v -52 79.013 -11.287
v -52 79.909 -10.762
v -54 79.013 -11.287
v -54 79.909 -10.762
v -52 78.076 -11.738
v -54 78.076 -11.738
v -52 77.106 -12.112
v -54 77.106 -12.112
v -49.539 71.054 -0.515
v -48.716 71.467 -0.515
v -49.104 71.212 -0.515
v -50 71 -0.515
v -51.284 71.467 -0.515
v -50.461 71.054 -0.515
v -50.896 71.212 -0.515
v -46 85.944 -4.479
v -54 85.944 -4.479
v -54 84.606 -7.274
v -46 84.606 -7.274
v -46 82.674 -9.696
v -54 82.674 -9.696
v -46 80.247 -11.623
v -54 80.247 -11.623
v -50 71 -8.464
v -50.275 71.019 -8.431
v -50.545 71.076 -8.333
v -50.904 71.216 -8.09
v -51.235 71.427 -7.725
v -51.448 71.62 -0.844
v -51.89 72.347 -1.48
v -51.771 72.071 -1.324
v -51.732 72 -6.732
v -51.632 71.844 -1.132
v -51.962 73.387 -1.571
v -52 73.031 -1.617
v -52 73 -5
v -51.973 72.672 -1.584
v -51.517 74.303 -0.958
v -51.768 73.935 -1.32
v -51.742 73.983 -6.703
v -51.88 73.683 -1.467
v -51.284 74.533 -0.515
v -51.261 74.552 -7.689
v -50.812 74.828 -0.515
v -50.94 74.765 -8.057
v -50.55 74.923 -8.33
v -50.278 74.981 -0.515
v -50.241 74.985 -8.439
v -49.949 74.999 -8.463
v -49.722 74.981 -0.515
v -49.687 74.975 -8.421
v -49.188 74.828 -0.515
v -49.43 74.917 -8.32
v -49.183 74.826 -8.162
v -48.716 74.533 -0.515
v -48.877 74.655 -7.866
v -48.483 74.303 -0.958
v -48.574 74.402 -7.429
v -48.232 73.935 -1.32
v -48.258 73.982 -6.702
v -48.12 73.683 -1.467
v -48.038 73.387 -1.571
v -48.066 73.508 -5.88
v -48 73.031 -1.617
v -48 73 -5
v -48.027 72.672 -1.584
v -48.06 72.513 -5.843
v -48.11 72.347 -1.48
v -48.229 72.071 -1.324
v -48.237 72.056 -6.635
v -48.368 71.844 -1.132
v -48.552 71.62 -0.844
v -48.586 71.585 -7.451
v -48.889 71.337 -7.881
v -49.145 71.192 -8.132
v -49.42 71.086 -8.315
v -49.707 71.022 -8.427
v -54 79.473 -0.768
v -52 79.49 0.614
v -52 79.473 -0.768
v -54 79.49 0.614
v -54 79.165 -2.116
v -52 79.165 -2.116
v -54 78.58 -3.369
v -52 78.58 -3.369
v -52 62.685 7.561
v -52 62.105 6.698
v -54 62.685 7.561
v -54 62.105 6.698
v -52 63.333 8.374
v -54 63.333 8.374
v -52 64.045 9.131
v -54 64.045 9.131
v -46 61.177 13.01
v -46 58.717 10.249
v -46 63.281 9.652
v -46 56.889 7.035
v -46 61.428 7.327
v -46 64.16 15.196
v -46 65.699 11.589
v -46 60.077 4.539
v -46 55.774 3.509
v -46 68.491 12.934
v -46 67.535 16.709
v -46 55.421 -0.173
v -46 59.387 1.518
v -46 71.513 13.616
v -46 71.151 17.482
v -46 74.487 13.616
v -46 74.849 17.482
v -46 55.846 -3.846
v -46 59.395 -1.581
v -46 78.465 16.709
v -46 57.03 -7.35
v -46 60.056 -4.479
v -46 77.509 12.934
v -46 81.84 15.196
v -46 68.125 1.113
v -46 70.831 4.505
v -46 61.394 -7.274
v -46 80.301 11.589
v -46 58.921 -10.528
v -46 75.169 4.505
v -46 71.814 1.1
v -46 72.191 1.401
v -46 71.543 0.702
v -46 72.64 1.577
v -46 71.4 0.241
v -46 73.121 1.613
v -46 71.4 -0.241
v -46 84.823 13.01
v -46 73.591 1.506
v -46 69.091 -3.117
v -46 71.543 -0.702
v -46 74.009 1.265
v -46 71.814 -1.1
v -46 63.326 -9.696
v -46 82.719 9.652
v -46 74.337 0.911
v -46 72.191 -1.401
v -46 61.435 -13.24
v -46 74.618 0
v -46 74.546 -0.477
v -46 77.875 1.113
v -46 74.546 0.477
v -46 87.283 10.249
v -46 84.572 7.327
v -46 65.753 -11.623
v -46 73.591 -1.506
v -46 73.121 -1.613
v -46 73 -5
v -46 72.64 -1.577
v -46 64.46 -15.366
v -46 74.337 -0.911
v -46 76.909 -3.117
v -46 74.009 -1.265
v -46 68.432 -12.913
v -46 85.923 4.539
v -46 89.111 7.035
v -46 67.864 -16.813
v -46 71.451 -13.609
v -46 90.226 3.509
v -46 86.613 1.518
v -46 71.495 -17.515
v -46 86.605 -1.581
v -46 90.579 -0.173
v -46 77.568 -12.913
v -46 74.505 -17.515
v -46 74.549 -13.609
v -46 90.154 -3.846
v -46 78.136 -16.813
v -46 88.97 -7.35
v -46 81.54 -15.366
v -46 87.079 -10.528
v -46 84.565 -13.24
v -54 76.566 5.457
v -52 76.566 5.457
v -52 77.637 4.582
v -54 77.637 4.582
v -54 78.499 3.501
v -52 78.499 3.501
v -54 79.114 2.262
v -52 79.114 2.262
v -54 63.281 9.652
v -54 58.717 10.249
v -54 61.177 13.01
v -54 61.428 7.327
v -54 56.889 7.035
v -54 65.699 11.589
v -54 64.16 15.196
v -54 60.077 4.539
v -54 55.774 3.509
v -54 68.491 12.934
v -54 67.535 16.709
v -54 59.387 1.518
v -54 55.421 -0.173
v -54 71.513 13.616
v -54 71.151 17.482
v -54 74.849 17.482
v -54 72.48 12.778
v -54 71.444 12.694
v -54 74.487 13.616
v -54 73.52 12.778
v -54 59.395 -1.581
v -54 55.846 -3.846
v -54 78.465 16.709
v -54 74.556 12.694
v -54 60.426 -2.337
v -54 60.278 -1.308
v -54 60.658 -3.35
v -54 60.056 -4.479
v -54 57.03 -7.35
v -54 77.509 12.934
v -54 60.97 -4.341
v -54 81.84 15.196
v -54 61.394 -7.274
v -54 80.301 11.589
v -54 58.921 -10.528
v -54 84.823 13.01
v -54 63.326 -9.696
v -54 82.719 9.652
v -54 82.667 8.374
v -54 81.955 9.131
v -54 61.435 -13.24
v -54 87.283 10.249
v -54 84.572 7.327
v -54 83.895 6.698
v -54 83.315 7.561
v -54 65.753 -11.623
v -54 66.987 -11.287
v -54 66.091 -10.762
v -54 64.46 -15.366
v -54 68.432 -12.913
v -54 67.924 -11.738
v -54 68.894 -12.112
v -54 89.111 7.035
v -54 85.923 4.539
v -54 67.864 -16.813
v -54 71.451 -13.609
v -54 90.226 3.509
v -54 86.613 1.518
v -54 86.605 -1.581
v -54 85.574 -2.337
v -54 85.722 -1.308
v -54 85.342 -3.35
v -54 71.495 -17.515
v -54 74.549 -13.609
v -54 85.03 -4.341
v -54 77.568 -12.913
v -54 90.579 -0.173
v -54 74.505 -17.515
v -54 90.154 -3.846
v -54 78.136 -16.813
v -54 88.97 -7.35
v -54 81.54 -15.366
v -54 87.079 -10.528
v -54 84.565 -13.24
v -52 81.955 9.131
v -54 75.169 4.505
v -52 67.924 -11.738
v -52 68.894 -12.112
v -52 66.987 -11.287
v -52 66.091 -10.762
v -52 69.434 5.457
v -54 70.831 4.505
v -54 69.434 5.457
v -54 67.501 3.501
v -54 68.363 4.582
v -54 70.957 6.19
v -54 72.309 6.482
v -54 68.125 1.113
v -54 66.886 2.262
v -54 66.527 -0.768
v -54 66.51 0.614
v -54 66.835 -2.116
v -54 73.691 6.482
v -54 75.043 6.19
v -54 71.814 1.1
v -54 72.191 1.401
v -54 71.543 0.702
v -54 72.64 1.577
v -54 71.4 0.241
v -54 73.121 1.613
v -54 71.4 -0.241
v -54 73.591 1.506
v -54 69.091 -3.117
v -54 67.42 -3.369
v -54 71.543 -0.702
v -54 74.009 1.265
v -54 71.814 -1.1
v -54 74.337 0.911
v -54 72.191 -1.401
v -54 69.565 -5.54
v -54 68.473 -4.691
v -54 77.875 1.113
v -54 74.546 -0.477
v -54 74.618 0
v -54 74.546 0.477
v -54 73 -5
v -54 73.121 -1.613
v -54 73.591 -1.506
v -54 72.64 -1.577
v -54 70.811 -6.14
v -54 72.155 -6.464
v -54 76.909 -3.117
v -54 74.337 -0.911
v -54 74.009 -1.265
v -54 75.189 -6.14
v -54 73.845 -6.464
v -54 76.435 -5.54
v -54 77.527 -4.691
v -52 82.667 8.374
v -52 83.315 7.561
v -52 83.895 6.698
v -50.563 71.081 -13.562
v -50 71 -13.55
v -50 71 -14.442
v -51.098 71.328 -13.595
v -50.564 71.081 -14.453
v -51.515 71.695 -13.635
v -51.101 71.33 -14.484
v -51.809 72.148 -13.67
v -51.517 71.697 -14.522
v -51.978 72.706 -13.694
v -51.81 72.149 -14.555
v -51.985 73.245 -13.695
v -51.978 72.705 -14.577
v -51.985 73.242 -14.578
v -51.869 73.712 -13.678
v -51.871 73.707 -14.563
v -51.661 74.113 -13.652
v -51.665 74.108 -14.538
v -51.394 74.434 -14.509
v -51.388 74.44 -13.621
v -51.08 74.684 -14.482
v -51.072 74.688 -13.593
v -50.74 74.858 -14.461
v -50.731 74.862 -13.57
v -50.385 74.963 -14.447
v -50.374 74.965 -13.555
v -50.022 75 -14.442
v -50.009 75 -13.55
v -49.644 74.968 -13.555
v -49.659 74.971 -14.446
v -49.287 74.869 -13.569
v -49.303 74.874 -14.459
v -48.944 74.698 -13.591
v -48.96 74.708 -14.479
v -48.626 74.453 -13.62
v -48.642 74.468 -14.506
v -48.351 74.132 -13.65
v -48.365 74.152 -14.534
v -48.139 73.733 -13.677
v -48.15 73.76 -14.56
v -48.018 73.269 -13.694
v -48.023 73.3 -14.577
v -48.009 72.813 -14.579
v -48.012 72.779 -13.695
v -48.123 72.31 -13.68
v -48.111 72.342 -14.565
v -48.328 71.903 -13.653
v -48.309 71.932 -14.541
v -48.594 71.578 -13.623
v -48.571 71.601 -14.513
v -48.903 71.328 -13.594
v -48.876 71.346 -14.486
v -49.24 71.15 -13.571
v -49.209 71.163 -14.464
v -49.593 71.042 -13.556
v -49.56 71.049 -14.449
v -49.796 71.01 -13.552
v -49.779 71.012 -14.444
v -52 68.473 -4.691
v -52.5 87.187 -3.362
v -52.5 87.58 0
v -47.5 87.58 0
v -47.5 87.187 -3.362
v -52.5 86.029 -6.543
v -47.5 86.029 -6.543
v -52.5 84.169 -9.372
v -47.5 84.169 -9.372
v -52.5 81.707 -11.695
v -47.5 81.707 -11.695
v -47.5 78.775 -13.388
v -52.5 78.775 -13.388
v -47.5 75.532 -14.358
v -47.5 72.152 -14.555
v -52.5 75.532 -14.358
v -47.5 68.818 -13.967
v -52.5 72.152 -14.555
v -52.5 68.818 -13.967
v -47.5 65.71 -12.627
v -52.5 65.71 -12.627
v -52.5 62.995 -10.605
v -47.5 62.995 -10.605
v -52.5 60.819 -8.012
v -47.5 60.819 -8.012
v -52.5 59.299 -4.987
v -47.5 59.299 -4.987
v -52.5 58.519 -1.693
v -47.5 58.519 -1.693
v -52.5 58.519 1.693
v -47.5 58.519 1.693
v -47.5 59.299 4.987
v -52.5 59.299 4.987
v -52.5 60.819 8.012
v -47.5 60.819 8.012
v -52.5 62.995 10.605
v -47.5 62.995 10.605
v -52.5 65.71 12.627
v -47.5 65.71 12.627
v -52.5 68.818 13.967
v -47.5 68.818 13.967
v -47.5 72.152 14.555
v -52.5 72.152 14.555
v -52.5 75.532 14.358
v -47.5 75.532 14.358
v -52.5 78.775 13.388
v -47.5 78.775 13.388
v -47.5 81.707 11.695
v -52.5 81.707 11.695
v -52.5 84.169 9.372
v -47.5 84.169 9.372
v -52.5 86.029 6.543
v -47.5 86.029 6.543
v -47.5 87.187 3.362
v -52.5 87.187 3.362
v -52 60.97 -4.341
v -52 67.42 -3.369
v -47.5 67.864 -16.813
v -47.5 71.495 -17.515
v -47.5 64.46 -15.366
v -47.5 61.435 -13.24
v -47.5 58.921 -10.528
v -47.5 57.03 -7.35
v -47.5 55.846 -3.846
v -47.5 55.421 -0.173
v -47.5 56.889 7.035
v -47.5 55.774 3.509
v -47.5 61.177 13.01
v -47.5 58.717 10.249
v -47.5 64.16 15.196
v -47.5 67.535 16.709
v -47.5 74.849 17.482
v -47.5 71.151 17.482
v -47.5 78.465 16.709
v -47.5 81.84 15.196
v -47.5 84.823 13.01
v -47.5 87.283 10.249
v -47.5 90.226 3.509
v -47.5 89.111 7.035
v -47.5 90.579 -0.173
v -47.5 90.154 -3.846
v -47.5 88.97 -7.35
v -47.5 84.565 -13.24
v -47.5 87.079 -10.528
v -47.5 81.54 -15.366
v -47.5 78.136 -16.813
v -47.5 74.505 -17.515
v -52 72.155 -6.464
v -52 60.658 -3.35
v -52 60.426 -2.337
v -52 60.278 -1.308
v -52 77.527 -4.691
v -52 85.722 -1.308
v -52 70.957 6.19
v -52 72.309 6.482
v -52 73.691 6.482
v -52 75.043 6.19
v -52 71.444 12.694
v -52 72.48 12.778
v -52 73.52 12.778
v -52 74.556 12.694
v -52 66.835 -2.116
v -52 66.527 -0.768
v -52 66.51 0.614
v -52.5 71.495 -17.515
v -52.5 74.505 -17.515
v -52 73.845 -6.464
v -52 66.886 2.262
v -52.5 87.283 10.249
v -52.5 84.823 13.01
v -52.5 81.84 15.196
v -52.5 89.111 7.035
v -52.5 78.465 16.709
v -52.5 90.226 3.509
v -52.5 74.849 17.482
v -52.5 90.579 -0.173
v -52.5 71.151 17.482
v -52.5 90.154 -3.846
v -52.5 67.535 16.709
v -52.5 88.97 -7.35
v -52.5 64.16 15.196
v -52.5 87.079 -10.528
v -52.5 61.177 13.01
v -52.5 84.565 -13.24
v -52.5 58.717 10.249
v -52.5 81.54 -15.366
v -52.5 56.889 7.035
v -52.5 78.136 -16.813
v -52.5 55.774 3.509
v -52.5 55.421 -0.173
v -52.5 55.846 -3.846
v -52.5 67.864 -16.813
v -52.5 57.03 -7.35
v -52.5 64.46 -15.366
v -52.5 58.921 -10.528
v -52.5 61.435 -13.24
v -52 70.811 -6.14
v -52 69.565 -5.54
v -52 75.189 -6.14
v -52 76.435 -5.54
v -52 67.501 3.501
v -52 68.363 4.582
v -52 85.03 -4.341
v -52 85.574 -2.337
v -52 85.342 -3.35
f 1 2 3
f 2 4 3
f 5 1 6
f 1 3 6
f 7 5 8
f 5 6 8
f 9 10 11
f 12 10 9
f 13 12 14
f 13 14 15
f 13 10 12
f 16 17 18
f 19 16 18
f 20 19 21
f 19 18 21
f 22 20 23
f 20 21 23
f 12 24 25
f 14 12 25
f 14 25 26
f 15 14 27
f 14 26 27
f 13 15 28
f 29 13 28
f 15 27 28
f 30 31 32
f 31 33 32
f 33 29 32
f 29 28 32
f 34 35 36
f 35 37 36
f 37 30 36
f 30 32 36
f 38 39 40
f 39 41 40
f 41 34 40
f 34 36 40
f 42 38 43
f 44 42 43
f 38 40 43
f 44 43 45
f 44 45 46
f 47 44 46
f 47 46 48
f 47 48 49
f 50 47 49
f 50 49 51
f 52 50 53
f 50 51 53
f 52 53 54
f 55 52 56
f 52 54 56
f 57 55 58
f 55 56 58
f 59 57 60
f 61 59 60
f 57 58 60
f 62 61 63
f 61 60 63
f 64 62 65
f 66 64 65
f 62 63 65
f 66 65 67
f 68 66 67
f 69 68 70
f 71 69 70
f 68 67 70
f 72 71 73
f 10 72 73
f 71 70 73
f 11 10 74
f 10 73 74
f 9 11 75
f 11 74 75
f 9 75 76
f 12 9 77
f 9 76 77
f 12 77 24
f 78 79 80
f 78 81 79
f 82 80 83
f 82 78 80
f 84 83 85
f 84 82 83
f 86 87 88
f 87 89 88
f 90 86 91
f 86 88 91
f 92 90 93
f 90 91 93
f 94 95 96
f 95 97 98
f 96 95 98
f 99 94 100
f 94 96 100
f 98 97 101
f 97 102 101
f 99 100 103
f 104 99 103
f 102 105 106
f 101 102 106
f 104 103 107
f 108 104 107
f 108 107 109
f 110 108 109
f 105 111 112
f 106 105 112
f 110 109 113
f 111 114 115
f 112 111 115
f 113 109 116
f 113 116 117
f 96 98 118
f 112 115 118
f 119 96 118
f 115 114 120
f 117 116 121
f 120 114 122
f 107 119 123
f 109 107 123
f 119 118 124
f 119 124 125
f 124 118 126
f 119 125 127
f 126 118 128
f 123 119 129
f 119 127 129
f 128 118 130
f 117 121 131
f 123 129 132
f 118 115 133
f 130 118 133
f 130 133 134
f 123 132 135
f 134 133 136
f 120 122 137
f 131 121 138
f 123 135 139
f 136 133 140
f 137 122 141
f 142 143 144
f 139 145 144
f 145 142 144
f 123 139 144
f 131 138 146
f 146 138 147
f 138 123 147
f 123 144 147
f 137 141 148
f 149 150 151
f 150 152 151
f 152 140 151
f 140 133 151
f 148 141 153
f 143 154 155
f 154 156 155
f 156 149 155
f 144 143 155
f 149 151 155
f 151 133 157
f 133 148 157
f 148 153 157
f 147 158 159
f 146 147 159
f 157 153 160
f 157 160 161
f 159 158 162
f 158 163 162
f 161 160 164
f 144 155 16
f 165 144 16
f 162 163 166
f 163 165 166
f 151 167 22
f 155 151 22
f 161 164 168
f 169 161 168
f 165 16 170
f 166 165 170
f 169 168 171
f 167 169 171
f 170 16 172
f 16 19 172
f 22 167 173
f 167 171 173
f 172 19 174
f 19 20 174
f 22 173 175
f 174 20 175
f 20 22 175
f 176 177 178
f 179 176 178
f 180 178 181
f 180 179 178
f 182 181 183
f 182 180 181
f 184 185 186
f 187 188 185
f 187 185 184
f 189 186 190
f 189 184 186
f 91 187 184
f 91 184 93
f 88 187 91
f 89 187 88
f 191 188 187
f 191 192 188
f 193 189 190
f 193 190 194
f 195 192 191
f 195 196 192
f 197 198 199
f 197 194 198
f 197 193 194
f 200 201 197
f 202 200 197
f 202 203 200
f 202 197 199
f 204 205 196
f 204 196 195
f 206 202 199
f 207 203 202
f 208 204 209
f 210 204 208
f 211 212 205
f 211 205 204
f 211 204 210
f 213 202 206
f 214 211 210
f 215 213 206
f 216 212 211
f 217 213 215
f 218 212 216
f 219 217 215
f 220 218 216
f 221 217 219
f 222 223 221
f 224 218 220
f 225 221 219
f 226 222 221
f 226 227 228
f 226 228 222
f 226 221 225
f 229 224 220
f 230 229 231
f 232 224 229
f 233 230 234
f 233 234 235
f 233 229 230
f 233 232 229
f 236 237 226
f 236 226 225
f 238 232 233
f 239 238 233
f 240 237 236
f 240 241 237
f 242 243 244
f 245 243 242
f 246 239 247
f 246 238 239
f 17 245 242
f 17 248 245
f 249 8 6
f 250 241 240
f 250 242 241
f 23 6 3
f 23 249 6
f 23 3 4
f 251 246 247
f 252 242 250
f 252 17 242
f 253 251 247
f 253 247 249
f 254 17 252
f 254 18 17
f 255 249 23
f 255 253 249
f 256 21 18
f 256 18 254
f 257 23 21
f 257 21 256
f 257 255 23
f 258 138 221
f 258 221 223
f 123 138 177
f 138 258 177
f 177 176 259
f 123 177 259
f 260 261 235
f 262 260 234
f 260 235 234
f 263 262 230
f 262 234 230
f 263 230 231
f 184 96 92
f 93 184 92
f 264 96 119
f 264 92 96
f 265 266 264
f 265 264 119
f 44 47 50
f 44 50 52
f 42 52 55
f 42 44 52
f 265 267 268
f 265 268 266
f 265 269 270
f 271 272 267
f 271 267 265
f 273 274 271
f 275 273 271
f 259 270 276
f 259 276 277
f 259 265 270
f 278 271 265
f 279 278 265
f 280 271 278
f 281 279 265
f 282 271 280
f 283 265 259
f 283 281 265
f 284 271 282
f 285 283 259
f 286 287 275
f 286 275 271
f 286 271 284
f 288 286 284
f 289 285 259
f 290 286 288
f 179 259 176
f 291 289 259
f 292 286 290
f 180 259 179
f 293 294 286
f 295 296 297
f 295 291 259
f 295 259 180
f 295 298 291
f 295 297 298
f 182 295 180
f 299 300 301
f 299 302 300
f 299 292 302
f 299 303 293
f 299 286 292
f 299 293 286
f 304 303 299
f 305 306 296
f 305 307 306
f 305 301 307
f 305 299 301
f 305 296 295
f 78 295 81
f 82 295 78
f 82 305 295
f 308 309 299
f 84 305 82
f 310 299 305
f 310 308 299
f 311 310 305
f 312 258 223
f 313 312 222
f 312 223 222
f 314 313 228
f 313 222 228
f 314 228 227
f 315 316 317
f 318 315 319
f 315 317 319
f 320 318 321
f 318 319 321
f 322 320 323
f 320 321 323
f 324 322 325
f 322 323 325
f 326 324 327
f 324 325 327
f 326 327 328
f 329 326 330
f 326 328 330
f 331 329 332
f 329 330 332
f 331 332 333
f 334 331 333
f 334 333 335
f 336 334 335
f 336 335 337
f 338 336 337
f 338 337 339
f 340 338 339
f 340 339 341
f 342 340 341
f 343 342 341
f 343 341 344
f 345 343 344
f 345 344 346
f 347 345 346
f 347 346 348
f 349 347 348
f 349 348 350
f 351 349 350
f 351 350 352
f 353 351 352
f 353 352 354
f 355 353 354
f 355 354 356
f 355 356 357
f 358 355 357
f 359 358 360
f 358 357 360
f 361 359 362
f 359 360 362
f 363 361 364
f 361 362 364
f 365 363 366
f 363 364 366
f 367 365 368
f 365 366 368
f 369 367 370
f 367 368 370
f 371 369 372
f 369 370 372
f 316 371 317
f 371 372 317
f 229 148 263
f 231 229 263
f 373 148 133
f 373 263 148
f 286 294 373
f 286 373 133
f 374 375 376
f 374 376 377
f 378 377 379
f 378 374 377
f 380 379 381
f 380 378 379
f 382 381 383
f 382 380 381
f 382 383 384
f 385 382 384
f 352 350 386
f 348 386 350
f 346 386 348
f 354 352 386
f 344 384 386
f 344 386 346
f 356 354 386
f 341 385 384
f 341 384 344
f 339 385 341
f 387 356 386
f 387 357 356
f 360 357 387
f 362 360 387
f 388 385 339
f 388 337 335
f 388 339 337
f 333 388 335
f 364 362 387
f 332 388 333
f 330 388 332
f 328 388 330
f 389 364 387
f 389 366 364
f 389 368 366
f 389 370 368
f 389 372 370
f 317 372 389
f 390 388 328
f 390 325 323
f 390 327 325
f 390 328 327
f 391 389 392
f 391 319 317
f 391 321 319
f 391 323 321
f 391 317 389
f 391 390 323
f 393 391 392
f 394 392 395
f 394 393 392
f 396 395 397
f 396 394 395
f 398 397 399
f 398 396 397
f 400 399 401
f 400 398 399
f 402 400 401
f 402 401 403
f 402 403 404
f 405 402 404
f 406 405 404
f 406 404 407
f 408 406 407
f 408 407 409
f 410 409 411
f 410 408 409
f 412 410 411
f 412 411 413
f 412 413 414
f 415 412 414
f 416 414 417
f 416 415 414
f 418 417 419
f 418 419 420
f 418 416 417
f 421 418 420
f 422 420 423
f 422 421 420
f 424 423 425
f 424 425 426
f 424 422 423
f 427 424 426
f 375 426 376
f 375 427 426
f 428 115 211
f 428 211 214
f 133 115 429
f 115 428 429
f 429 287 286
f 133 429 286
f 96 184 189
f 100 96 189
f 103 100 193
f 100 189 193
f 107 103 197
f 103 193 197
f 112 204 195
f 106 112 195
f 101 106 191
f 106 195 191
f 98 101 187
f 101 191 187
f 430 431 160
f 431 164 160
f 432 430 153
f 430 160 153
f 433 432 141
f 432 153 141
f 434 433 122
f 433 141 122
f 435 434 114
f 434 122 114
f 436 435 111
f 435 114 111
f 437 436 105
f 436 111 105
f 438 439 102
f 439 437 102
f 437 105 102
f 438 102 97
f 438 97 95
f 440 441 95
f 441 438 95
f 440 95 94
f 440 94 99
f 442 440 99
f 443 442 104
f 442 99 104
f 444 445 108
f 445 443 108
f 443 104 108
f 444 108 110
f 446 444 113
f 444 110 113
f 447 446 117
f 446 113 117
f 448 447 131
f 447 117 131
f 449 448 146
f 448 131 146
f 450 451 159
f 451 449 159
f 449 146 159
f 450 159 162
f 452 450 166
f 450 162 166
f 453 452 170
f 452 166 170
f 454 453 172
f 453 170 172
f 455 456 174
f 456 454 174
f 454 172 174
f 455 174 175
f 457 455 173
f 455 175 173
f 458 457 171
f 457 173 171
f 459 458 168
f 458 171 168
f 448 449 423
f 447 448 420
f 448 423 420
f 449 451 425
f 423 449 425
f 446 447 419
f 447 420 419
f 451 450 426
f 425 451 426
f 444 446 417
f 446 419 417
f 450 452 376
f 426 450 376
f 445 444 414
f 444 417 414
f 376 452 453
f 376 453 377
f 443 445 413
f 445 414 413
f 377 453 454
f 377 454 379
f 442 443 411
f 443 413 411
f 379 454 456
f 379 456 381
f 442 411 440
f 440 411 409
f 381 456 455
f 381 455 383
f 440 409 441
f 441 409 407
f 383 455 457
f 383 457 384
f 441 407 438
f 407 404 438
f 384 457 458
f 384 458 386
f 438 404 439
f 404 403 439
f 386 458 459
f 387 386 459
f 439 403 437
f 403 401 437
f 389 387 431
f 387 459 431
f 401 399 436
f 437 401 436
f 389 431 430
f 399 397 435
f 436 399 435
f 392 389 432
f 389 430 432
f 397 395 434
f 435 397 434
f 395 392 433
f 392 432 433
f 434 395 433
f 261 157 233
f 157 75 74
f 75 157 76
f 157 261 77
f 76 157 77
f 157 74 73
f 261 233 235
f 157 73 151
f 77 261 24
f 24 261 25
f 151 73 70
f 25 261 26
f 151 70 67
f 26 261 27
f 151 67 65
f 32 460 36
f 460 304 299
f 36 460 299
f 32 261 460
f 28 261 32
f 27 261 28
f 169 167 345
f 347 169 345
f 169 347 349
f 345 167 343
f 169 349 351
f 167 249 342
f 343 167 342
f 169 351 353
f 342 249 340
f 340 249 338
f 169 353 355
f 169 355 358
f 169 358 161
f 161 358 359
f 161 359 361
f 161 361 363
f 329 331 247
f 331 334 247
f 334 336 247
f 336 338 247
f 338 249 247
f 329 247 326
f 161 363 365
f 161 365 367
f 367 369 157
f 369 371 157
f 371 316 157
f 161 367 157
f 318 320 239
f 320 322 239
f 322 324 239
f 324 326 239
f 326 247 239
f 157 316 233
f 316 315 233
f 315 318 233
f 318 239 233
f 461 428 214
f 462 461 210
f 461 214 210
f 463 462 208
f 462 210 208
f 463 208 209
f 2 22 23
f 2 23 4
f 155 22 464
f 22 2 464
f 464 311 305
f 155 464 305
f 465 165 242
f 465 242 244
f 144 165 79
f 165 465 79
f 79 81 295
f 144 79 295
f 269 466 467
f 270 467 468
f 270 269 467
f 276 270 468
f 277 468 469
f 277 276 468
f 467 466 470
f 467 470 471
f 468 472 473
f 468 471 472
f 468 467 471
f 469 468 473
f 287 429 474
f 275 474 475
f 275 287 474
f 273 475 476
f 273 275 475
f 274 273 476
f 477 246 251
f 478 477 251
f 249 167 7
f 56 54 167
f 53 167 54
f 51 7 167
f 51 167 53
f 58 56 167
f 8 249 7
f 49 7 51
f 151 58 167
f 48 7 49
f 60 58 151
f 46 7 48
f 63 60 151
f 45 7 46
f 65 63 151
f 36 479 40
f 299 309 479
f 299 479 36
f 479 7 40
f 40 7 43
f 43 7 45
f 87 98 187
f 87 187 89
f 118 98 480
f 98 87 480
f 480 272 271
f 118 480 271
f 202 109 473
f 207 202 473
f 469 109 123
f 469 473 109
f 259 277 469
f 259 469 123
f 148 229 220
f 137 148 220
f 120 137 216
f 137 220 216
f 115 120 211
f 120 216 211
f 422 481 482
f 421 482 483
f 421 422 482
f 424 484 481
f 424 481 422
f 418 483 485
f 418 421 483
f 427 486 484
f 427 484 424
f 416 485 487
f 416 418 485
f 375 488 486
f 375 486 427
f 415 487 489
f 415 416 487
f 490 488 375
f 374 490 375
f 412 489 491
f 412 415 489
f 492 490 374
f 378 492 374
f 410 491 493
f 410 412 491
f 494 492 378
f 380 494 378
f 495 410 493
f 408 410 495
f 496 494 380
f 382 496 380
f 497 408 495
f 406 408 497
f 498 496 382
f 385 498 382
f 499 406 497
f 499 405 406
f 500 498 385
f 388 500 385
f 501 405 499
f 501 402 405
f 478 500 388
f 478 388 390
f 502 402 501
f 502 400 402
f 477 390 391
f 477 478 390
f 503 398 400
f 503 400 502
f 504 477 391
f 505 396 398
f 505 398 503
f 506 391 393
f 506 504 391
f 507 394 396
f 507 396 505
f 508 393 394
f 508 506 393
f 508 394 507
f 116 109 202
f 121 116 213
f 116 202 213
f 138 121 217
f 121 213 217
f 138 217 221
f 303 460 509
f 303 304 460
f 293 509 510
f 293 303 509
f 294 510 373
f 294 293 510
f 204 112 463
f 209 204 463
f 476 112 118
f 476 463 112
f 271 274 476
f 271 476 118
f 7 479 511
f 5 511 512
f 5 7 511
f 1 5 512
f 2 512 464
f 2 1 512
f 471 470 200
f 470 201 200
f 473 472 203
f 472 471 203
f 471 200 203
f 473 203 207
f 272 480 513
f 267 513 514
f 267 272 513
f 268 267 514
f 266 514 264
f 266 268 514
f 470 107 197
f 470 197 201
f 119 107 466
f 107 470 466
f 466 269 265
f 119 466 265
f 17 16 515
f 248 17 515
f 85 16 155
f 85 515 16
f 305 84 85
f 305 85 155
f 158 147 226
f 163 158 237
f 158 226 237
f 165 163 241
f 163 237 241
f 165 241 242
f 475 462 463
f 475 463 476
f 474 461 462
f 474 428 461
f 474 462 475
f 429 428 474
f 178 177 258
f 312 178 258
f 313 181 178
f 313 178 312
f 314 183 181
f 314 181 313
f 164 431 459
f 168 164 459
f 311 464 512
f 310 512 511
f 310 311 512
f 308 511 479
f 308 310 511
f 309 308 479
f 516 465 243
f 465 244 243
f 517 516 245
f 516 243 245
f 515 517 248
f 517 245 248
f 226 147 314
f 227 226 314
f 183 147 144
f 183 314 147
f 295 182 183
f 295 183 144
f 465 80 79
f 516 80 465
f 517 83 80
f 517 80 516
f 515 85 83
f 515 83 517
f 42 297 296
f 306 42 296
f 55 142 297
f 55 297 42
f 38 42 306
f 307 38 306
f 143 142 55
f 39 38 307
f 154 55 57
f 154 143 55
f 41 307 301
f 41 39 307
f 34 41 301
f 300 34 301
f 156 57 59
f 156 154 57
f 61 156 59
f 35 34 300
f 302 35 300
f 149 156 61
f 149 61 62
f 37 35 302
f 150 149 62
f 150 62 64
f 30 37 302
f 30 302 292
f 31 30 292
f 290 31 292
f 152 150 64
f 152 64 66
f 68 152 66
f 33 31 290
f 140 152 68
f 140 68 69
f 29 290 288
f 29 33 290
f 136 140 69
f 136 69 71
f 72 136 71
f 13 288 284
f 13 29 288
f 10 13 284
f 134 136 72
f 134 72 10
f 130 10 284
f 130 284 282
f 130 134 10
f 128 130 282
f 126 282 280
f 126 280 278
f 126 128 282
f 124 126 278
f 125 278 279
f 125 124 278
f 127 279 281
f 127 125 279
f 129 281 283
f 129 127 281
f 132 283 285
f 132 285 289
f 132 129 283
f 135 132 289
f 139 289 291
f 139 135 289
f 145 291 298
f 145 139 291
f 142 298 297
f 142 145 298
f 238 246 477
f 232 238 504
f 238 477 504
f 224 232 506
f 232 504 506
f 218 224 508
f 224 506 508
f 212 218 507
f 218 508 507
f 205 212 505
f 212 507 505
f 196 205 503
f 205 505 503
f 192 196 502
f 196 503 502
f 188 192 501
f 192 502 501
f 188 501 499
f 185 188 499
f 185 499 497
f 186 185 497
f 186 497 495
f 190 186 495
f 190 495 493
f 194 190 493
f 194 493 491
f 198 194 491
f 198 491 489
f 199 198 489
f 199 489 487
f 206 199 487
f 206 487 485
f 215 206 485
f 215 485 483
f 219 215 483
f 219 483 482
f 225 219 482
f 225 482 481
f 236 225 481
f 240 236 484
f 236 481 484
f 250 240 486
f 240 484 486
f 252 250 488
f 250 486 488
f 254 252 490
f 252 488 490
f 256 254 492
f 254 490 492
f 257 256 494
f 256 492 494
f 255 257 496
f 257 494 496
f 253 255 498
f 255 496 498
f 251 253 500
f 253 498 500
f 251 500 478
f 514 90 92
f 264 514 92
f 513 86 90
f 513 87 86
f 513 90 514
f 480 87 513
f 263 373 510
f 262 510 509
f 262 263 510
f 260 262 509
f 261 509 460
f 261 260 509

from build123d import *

# Parameters (mm, degrees)
SKETCH100_R             = 17.579923
SKETCH100_R_2           = 1.617669
PAD044_DEPTH            = 8
SKETCH101_W             = 5
SKETCH101_H             = 3
SKETCH102_R             = 12.788983
SKETCH102_R_2           = 6.518589
POCKET072_DEPTH         = 2
SKETCH103_W             = 7.319854
SKETCH103_H             = 4.413105
POCKET073_DEPTH         = 8.001
POCKET075_DEPTH         = 108.636829
POLARPATTERN003_COUNT   = 7
SKETCH112_R             = 2
POCKET079_DEPTH         = 17
BODY019_PLACEMENT_ANGLE = 180


with BuildPart() as part:
    # Sketch100 → Pad044 (new body)
    with BuildSketch(Plane.YZ):
        Circle(SKETCH100_R)
        Circle(SKETCH100_R_2, mode=Mode.SUBTRACT)
    extrude(amount=PAD044_DEPTH)

    # Sketch101 → Groove003 (revolve, cut)
    with BuildSketch(Plane.XY):
        with Locations((4, 16.079923)):
            Rectangle(SKETCH101_W, SKETCH101_H)
    revolve(axis=Axis((0, 0, 0), (1, 0, 0)), mode=Mode.SUBTRACT)

    # Sketch102 (on Face6 of Groove003) → Pocket072 (cut)
    with BuildSketch(Plane.YZ.offset(8)):
        Circle(SKETCH102_R)
        Circle(SKETCH102_R_2, mode=Mode.SUBTRACT)
    extrude(amount=-POCKET072_DEPTH, mode=Mode.SUBTRACT)

    # Sketch103 (on Face11 of Pocket072) → Pocket073 (cut, through all)
    with BuildSketch(Plane.YZ.offset(8)):
        with Locations((-0.062492, 19.721895)):
            Rectangle(SKETCH103_W, SKETCH103_H)
    extrude(amount=-POCKET073_DEPTH, mode=Mode.SUBTRACT)

    # Sketch105 → Pocket075 (cut, through all)
    with BuildSketch(Plane.YZ.offset(8)):
        with BuildLine():
            ThreePointArc((4.568379, 12.912664), (0, 13.69697), (-4.568379, 12.912664))
            Line((-4.568379, 12.912664), (0, 5))
            Line((4.568379, 12.912664), (0, 5))
        make_face()
    pocket075 = extrude(amount=-POCKET075_DEPTH, mode=Mode.SUBTRACT)

    # PolarPattern003: Pocket075 ×7 about axis
    polarpattern003_axis = Axis((0, 0, 0), (1, 0, 0))
    for i in range(1, POLARPATTERN003_COUNT):
        add(pocket075.rotate(polarpattern003_axis, i * 360 / POLARPATTERN003_COUNT), mode=Mode.SUBTRACT)

    # Sketch112 (on Face55 of PolarPattern003) → Pocket079 (cut)
    with BuildSketch(Plane(origin=(0, 0, 17.515343), x_dir=(0, -1, 0), z_dir=(0, 0, 1))):
        with Locations((0, 4)):
            Circle(SKETCH112_R)
    extrude(amount=-POCKET079_DEPTH, mode=Mode.SUBTRACT)


with BuildPart() as part_1:
    # Body016 placement: moved
    add(part.part.moved(Location((46, 73, 0))))


with BuildPart() as part_2:
    # Body019 placement: moved
    add(part_1.part.rotate(Axis((0, 0, 0), (0, 1, 0)), BODY019_PLACEMENT_ANGLE))


solid = part_2.part
